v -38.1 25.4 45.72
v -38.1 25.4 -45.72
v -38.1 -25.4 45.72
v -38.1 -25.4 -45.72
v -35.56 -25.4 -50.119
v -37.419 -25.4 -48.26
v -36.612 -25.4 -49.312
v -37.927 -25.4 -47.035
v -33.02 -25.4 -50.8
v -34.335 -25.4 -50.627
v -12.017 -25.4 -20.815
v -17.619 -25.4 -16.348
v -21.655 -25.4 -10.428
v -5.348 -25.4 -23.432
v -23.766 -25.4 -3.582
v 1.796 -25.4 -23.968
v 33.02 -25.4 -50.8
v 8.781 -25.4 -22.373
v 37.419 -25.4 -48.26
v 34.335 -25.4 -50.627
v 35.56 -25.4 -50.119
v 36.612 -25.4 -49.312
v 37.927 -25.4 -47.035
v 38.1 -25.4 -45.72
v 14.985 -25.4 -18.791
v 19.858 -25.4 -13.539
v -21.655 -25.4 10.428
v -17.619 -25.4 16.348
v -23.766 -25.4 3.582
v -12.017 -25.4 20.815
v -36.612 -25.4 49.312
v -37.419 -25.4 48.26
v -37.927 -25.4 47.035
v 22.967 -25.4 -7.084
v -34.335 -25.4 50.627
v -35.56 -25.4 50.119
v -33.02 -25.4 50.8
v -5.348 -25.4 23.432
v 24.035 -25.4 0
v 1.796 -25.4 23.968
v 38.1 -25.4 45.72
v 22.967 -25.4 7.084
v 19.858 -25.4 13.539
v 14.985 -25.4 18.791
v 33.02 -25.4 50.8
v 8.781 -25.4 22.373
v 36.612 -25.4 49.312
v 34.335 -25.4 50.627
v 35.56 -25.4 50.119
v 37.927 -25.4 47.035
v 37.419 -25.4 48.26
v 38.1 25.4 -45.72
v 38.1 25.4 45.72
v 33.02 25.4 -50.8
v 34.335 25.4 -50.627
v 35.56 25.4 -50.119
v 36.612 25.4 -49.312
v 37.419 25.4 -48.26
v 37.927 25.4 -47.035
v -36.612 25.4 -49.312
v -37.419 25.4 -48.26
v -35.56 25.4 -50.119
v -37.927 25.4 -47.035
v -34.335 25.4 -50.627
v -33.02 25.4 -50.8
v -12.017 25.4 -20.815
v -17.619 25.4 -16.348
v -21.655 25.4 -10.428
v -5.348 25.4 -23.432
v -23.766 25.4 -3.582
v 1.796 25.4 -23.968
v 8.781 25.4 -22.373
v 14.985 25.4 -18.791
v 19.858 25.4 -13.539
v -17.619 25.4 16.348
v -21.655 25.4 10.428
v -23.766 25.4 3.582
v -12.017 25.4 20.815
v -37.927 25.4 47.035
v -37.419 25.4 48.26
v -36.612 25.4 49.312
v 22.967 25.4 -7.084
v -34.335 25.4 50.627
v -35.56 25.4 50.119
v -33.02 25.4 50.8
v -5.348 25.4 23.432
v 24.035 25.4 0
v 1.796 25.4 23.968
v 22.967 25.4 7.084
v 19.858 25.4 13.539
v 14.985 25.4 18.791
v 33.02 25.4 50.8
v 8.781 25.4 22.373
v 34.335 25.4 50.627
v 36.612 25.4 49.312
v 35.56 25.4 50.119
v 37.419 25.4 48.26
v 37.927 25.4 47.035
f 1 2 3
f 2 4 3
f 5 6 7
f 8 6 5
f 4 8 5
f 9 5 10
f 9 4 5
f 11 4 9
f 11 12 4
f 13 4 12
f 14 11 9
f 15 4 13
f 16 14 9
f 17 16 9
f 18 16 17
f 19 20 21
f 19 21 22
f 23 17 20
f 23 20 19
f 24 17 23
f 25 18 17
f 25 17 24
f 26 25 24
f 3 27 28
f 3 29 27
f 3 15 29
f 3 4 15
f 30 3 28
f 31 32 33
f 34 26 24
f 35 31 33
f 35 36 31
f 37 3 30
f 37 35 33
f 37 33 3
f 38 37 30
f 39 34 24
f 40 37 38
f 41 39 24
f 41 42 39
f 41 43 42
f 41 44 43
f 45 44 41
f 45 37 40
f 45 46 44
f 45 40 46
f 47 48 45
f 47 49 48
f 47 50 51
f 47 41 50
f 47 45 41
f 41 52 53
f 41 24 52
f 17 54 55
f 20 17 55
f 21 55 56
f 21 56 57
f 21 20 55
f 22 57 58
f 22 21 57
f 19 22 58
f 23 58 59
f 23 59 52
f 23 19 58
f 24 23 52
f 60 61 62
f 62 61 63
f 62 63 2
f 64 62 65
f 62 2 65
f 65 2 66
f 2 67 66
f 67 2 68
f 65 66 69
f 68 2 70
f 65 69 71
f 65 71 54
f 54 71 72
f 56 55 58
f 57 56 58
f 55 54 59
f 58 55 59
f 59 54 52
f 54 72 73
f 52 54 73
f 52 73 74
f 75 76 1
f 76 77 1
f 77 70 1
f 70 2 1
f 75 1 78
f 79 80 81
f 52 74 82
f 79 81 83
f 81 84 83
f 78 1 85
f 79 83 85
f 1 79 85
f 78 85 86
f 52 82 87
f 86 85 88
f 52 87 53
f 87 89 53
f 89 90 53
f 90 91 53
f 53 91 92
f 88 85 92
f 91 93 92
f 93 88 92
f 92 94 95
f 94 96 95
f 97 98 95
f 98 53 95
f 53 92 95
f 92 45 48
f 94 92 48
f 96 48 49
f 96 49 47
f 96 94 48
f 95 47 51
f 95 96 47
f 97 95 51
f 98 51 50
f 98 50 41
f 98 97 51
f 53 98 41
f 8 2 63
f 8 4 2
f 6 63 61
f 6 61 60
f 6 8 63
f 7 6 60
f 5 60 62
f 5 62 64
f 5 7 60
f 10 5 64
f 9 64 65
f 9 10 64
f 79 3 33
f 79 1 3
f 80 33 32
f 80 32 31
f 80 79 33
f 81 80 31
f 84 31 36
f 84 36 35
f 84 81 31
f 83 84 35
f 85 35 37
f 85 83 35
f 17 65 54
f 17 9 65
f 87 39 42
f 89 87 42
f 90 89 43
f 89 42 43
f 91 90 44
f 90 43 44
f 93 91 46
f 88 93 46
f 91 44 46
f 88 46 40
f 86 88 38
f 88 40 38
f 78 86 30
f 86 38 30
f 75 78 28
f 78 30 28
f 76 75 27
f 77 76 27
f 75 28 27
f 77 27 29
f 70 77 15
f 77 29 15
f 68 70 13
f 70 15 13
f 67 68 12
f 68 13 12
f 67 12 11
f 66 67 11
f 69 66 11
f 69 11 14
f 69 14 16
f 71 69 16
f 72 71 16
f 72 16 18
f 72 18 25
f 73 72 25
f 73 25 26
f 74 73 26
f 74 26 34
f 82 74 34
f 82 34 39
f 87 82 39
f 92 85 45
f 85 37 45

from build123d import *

# Parameters (mm, degrees)
F0_W     = 76.2
F0_H     = 101.6
F1_DEPTH = 25.4
F2_R     = 24.034722
F3_DEPTH = 50.801
F4_R     = 5.08


with BuildPart() as f1:
    # F0 (on Front) → F1 (new body, symmetric)
    with BuildSketch(Plane.XZ):
        Rectangle(F0_W, F0_H)
    extrude(amount=F1_DEPTH, both=True)

    # F2 (on face) → F3 (cut, through all)
    with BuildSketch(Plane.XZ.offset(25.4)):
        Circle(F2_R)
    extrude(amount=-F3_DEPTH, mode=Mode.SUBTRACT)

    # F4
    f4_edges = [f1.edges().sort_by_distance(p)[0] for p in [
        (-38.1, 0, 50.8),
        (38.1, 0, 50.8),
        (38.1, 0, -50.8),
        (-38.1, 0, -50.8),
    ]]
    fillet(f4_edges, radius=F4_R)


solid = f1.part
